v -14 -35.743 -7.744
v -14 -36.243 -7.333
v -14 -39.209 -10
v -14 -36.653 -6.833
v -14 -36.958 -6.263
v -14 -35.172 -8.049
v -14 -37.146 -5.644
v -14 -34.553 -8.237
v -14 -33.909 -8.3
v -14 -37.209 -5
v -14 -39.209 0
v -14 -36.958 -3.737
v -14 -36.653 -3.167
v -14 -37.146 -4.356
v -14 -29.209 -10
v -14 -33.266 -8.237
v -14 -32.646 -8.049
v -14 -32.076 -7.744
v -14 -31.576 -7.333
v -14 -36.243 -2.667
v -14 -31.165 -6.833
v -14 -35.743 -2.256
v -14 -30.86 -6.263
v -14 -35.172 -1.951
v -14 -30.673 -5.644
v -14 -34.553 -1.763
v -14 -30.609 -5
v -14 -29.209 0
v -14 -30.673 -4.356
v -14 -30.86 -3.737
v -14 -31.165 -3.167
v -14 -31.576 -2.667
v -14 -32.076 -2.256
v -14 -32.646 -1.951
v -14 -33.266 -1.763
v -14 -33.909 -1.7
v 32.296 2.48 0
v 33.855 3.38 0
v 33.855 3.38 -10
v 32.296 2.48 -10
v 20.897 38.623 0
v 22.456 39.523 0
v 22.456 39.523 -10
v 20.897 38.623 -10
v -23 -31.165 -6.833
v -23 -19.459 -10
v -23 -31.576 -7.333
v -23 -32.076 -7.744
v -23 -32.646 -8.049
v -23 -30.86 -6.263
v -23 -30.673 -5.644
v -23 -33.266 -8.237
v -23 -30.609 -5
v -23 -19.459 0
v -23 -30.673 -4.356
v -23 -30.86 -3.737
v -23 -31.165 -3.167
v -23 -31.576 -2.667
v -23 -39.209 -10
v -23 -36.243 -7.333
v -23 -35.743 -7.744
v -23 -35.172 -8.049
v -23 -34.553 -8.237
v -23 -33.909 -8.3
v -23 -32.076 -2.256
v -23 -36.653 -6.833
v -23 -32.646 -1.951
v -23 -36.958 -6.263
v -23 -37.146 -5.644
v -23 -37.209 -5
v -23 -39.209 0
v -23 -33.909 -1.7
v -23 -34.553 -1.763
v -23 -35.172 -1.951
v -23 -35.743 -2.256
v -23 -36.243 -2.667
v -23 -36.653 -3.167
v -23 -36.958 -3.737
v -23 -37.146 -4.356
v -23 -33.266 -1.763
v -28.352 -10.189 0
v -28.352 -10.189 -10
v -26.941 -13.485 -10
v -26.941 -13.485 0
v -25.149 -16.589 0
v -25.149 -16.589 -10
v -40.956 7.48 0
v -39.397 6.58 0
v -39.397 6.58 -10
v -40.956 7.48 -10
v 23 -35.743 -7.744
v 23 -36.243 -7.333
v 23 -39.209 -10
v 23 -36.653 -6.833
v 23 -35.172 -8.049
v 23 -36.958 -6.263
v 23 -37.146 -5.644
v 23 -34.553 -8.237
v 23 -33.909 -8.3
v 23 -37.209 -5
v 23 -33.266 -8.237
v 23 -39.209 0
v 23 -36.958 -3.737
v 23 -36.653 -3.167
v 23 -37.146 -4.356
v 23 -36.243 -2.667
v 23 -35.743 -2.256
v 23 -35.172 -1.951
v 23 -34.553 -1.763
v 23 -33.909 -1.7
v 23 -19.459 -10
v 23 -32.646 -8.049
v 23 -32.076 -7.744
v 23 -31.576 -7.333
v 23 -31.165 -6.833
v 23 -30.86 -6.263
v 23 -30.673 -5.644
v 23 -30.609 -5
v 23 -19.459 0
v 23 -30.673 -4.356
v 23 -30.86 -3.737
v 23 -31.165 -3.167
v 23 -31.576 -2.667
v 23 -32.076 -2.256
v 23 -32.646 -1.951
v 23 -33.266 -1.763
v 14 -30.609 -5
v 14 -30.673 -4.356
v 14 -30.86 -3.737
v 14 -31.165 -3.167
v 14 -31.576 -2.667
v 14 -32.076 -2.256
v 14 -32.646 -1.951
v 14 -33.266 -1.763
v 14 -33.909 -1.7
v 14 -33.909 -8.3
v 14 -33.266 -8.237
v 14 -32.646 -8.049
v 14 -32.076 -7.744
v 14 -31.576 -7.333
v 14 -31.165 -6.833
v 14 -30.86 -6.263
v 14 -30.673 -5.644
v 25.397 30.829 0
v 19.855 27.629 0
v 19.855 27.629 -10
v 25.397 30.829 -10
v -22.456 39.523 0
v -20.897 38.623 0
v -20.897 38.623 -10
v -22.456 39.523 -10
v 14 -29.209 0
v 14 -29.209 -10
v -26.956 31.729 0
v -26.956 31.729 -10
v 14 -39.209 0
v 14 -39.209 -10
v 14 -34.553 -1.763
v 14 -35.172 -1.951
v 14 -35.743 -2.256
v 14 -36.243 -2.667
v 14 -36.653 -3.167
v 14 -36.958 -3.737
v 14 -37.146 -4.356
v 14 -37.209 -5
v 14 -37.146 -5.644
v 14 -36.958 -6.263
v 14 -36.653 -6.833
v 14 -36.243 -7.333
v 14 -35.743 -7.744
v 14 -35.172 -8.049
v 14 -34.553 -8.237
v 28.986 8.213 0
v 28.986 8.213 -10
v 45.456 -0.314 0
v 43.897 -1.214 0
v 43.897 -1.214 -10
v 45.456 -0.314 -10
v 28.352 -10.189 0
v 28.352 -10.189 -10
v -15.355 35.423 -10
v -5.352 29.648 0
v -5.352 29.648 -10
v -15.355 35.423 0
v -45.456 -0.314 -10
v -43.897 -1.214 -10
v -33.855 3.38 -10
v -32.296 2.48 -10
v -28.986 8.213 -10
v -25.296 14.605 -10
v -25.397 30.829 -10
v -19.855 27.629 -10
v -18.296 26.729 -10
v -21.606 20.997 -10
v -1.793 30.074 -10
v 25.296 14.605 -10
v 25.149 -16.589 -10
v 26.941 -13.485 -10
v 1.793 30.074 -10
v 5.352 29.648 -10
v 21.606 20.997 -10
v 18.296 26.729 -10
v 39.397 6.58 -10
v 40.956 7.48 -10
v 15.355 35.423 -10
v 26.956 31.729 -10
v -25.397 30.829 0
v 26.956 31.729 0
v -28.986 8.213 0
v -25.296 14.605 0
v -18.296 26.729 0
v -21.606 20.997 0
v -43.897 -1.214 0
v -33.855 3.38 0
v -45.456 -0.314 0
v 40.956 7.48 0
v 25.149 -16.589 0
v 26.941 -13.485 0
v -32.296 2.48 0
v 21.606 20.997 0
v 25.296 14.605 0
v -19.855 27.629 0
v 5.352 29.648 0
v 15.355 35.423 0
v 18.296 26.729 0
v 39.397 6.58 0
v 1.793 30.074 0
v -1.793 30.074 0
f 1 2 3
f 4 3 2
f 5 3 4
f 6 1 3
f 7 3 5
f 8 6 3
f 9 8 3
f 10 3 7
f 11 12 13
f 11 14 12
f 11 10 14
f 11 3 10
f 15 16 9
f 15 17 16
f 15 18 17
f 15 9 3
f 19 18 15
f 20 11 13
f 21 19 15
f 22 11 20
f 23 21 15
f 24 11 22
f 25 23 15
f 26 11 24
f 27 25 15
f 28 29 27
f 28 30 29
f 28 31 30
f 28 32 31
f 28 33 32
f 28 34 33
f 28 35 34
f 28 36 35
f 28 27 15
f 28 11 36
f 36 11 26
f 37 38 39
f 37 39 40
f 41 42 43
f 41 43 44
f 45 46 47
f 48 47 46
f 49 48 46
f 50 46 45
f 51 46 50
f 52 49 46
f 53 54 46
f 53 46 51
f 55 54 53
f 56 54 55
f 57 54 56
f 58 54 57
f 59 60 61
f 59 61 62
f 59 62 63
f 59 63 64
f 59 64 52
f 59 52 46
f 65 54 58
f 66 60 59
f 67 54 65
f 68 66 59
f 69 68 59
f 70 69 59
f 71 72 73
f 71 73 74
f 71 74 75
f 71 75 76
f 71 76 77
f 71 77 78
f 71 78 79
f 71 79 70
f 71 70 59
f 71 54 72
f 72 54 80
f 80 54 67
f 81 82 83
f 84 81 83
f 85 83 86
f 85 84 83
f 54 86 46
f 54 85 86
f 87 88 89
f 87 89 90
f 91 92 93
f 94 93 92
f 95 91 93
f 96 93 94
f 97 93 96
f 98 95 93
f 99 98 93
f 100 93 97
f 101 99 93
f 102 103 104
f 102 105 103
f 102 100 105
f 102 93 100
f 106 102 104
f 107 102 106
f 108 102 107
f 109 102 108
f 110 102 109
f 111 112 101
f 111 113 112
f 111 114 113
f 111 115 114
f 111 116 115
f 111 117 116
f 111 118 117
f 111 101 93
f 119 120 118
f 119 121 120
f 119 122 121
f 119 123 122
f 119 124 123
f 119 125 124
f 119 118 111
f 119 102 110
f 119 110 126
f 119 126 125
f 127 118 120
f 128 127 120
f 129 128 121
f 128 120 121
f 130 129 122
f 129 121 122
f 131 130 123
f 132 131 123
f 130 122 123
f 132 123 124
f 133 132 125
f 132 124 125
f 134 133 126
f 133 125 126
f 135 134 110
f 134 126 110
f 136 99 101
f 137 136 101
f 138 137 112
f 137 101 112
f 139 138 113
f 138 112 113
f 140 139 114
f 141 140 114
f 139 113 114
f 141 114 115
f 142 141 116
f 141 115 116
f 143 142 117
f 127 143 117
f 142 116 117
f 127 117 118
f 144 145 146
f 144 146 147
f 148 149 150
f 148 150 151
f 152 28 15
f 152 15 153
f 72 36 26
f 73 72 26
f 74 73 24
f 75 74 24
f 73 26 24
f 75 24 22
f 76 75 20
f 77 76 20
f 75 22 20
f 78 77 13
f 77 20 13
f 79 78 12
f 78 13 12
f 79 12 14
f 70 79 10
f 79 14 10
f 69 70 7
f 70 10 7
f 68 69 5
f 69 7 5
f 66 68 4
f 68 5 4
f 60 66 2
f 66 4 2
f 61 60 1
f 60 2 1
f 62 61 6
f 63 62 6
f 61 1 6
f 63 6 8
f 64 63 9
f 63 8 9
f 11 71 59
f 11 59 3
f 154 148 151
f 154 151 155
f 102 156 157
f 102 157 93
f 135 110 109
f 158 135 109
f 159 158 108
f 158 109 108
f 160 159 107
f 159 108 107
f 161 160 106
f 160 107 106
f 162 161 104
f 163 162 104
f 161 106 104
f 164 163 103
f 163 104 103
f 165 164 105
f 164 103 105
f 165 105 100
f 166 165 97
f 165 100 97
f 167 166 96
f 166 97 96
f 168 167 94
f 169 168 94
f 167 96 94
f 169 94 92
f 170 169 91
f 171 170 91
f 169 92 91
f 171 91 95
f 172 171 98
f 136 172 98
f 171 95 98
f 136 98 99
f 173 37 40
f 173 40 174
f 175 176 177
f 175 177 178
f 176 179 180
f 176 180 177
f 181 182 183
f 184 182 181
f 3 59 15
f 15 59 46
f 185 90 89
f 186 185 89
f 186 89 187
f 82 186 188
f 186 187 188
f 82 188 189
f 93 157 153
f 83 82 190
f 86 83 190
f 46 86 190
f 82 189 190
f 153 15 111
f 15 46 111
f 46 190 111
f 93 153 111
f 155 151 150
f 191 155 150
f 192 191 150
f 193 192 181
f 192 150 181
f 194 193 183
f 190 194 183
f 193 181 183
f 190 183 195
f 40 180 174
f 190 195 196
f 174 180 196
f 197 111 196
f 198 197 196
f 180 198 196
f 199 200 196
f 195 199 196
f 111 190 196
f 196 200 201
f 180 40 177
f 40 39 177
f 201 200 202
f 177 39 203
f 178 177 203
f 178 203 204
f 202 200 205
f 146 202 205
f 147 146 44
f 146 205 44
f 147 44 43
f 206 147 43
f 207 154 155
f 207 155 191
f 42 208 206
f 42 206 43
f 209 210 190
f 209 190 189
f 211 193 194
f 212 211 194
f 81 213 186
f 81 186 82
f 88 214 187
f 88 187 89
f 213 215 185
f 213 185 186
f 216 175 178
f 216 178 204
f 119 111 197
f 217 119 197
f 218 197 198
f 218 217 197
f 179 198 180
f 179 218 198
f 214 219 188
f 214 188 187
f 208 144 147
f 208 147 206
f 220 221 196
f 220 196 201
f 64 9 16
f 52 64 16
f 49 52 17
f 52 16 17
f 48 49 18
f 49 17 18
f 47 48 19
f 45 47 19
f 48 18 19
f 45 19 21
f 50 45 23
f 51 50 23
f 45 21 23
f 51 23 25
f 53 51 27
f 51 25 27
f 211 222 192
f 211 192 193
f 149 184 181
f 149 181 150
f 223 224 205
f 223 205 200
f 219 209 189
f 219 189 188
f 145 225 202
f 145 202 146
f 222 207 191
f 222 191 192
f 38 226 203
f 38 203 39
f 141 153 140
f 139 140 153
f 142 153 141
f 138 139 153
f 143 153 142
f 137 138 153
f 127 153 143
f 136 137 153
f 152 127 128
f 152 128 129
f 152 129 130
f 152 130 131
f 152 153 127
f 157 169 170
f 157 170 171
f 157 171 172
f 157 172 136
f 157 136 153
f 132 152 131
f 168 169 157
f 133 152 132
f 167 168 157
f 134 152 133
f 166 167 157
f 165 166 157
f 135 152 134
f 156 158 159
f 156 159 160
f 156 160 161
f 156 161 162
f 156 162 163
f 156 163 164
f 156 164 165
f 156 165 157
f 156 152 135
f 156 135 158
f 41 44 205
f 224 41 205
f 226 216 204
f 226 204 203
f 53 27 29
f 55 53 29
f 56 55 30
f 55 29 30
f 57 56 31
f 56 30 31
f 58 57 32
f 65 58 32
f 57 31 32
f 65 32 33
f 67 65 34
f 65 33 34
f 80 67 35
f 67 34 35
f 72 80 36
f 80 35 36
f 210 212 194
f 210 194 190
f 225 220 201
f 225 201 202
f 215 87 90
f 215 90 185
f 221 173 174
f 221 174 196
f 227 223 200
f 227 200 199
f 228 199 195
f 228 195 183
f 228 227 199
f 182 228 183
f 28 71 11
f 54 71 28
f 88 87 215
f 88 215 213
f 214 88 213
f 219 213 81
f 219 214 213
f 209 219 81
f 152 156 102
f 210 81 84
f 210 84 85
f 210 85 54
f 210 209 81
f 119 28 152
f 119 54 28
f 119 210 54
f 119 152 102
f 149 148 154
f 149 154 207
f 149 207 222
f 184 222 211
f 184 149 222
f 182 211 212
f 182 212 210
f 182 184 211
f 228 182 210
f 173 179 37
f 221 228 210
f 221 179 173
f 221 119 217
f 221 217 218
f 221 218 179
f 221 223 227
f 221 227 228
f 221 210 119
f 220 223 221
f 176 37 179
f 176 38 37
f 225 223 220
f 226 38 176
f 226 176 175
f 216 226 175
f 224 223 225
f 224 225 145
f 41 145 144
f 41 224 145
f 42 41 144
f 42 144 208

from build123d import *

# Parameters (mm, degrees)
F0_W     = 9
F0_H     = 6.4
F0_H_2   = 1.8
F1_DEPTH = 10
F3_DEPTH = 68.4572498646


with BuildPart() as f1:
    # F0 (on Top) → F1 (new body)
    with BuildSketch(Plane.XY):
        with BuildLine():
            Line((-23, -13.2790561914), (-23, -19.4471))
            Line((-23, -19.4471), (-23, -19.4592028655))
            ThreePointArc((-23, -19.4592028655), (-15.9535433508, -25.5567022661), (-7.3808786516, -29.2093))
            Line((-7.3808786516, -29.2093), (0, -29.2093))
            Line((0, -29.2093), (0, 0))
            Line((0, 0), (-11.5, -19.918584287))
            Line((-11.5, -19.918584287), (-23, -13.2790561914))
        make_face()
        with BuildLine():
            Line((-23, -19.4592028655), (-23, -19.4471))
            Line((-23, -19.4471), (-23, -13.2790561914))
            Line((-23, -13.2790561914), (-28.3416826299, -10.195034287))
            Line((-28.3416826299, -10.195034287), (-28.3521640189, -10.1889828543))
            ThreePointArc((-28.3521640189, -10.1889828543), (-26.0910987143, -15.0637028662), (-23, -19.4592028655))
        make_face()
        with BuildLine():
            ThreePointArc((-7.3808786516, -29.2093), (-15.9535433508, -25.5567022661), (-23, -19.4592028655))
            Line((-23, -19.4592028655), (-23, -31.0093))
            Line((-23, -31.0093), (-14, -31.0093))
            Line((-14, -31.0093), (-14, -29.2093))
            Line((-14, -29.2093), (-7.3808786516, -29.2093))
        make_face()
        with BuildLine():
            Line((-28.3416826299, -10.195034287), (-23, -13.2790561914))
            Line((-23, -13.2790561914), (-23, 0))
            Line((-23, 0), (0, 0))
            Line((0, 0), (-25.2959958268, 14.60465))
            Line((-25.2959958268, 14.60465), (-28.9864351526, 8.2126215854))
            ThreePointArc((-28.9864351526, 8.2126215854), (-30.1095250747, -1.0378226891), (-28.3521640189, -10.1889828543))
            Line((-28.3521640189, -10.1889828543), (-28.3416826299, -10.195034287))
        make_face()
        Polygon((-23, 0), (-23, -13.2790561914), (-11.5, -19.918584287), (0, 0), align=None)
        with Locations((-18.5, -34.2093)):
            Rectangle(F0_W, F0_H)
        with BuildLine():
            Line((-38.3548415536, -4.413934287), (-28.3521640189, -10.1889828543))
            ThreePointArc((-28.3521640189, -10.1889828543), (-30.1095250747, -1.0378226891), (-28.9864351526, 8.2126215854))
            Line((-28.9864351526, 8.2126215854), (-32.2959958268, 2.480294347))
            Line((-32.2959958268, 2.480294347), (-33.8548415536, 3.380294347))
            Line((-33.8548415536, 3.380294347), (-38.3548415536, -4.413934287))
        make_face()
        with Locations((-18.5, -38.3093)):
            Rectangle(F0_W, F0_H_2)
        Polygon((-43.8974041378, -1.213934287), (-38.3548415536, -4.413934287), (-33.8548415536, 3.380294347), (-39.3974041378, 6.580294347), align=None)
        with BuildLine():
            Line((0, 0), (0, -29.2093))
            Line((0, -29.2093), (7.3808786516, -29.2093))
            ThreePointArc((7.3808786516, -29.2093), (15.9535433508, -25.5567022661), (23, -19.4592028655))
            Line((23, -19.4592028655), (23, -19.4471))
            Line((23, -19.4471), (23, -13.2790561914))
            Line((23, -13.2790561914), (11.5, -19.918584287))
            Line((11.5, -19.918584287), (0, 0))
        make_face()
        with BuildLine():
            Line((25.2959958268, 14.60465), (0, 0))
            Line((0, 0), (23, 0))
            Line((23, 0), (23, -13.2790561914))
            Line((23, -13.2790561914), (28.3416826299, -10.195034287))
            Line((28.3416826299, -10.195034287), (28.3521640189, -10.1889828543))
            ThreePointArc((28.3521640189, -10.1889828543), (29.6802773315, -5.1712390862), (30.1274057323, 0))
            ThreePointArc((30.1274057323, 0), (29.8407998279, 4.1457498468), (28.9864351526, 8.2126215854))
            Line((28.9864351526, 8.2126215854), (25.2959958268, 14.60465))
        make_face()
        with BuildLine():
            Line((11.5, 19.918584287), (0, 0))
            Line((0, 0), (25.2959958268, 14.60465))
            Line((25.2959958268, 14.60465), (21.6055565009, 20.9966784146))
            ThreePointArc((21.6055565009, 20.9966784146), (14.155981724, 26.5945249552), (5.3521640189, 29.6481857198))
            Line((5.3521640189, 29.6481857198), (5.3416826299, 29.642134287))
            Line((5.3416826299, 29.642134287), (0, 26.5581123827))
            Line((0, 26.5581123827), (11.5, 19.918584287))
        make_face()
        with BuildLine():
            Line((-25.2959958268, 14.60465), (0, 0))
            Line((0, 0), (-11.5, 19.918584287))
            Line((-11.5, 19.918584287), (0, 26.5581123827))
            Line((0, 26.5581123827), (-5.3416826299, 29.642134287))
            Line((-5.3416826299, 29.642134287), (-5.3521640189, 29.6481857198))
            ThreePointArc((-5.3521640189, 29.6481857198), (-14.155981724, 26.5945249552), (-21.6055565009, 20.9966784146))
            Line((-21.6055565009, 20.9966784146), (-25.2959958268, 14.60465))
        make_face()
        Polygon((23, 0), (0, 0), (11.5, -19.918584287), (23, -13.2790561914), align=None)
        Polygon((-11.5, 19.918584287), (0, 0), (11.5, 19.918584287), (0, 26.5581123827), align=None)
        Polygon((-45.4562498646, -0.313934287), (-43.8974041378, -1.213934287), (-39.3974041378, 6.580294347), (-40.9562498646, 7.480294347), align=None)
        with BuildLine():
            ThreePointArc((23, -19.4592028655), (15.9535433508, -25.5567022661), (7.3808786516, -29.2093))
            Line((7.3808786516, -29.2093), (14, -29.2093))
            Line((14, -29.2093), (14, -31.0093))
            Line((14, -31.0093), (23, -31.0093))
            Line((23, -31.0093), (23, -19.4592028655))
        make_face()
        with Locations((18.5, -34.2093)):
            Rectangle(F0_W, F0_H)
        with BuildLine():
            Line((-18.2959958268, 26.729005653), (-21.6055565009, 20.9966784146))
            ThreePointArc((-21.6055565009, 20.9966784146), (-14.155981724, 26.5945249552), (-5.3521640189, 29.6481857198))
            Line((-5.3521640189, 29.6481857198), (-15.3548415536, 35.423234287))
            Line((-15.3548415536, 35.423234287), (-19.8548415536, 27.629005653))
            Line((-19.8548415536, 27.629005653), (-18.2959958268, 26.729005653))
        make_face()
        with BuildLine():
            Line((23, -19.4471), (23, -19.4592028655))
            ThreePointArc((23, -19.4592028655), (26.0910987143, -15.0637028662), (28.3521640189, -10.1889828543))
            Line((28.3521640189, -10.1889828543), (28.3416826299, -10.195034287))
            Line((28.3416826299, -10.195034287), (23, -13.2790561914))
            Line((23, -13.2790561914), (23, -19.4471))
        make_face()
        with BuildLine():
            ThreePointArc((5.3521640189, 29.6481857198), (14.155981724, 26.5945249552), (21.6055565009, 20.9966784146))
            Line((21.6055565009, 20.9966784146), (18.2959958268, 26.729005653))
            Line((18.2959958268, 26.729005653), (19.8548415536, 27.629005653))
            Line((19.8548415536, 27.629005653), (15.3548415536, 35.423234287))
            Line((15.3548415536, 35.423234287), (5.3521640189, 29.6481857198))
        make_face()
        with BuildLine():
            Line((32.2959958268, 2.480294347), (28.9864351526, 8.2126215854))
            ThreePointArc((28.9864351526, 8.2126215854), (29.8407998279, 4.1457498468), (30.1274057323, 0))
            ThreePointArc((30.1274057323, 0), (29.6802773315, -5.1712390862), (28.3521640189, -10.1889828543))
            Line((28.3521640189, -10.1889828543), (38.3548415536, -4.413934287))
            Line((38.3548415536, -4.413934287), (33.8548415536, 3.380294347))
            Line((33.8548415536, 3.380294347), (32.2959958268, 2.480294347))
        make_face()
        with BuildLine():
            Line((-5.3416826299, 29.642134287), (0, 26.5581123827))
            Line((0, 26.5581123827), (5.3416826299, 29.642134287))
            Line((5.3416826299, 29.642134287), (5.3521640189, 29.6481857198))
            ThreePointArc((5.3521640189, 29.6481857198), (0, 30.1274057323), (-5.3521640189, 29.6481857198))
            Line((-5.3521640189, 29.6481857198), (-5.3416826299, 29.642134287))
        make_face()
        with Locations((18.5, -38.3093)):
            Rectangle(F0_W, F0_H_2)
        Polygon((-25.3974041378, 30.829005653), (-19.8548415536, 27.629005653), (-15.3548415536, 35.423234287), (-20.8974041378, 38.623234287), align=None)
        Polygon((-26.9562498646, 31.729005653), (-25.3974041378, 30.829005653), (-20.8974041378, 38.623234287), (-22.4562498646, 39.523234287), align=None)
        Polygon((33.8548415536, 3.380294347), (38.3548415536, -4.413934287), (43.8974041378, -1.213934287), (39.3974041378, 6.580294347), align=None)
        Polygon((15.3548415536, 35.423234287), (19.8548415536, 27.629005653), (25.3974041378, 30.829005653), (20.8974041378, 38.623234287), align=None)
        Polygon((39.3974041378, 6.580294347), (43.8974041378, -1.213934287), (45.4562498646, -0.313934287), (40.9562498646, 7.480294347), align=None)
        Polygon((20.8974041378, 38.623234287), (25.3974041378, 30.829005653), (26.9562498646, 31.729005653), (22.4562498646, 39.523234287), align=None)
    extrude(amount=-F1_DEPTH)

    # F2 (on face) → F3 (cut, through all)
    with BuildSketch(Plane.YZ.offset(23)):
        with BuildLine():
            ThreePointArc((-33.9093, -1.7), (-37.2093, -5), (-33.9093, -8.3))
            Line((-33.9093, -8.3), (-33.9093, -1.7))
        make_face()
        with BuildLine():
            Line((-33.9093, -1.7), (-33.9093, -8.3))
            ThreePointArc((-33.9093, -8.3), (-31.5758476221, -7.3334523779), (-30.6093, -5))
            ThreePointArc((-30.6093, -5), (-31.5758476221, -2.6665476221), (-33.9093, -1.7))
        make_face()
    extrude(amount=-F3_DEPTH, mode=Mode.SUBTRACT)


solid = f1.part
